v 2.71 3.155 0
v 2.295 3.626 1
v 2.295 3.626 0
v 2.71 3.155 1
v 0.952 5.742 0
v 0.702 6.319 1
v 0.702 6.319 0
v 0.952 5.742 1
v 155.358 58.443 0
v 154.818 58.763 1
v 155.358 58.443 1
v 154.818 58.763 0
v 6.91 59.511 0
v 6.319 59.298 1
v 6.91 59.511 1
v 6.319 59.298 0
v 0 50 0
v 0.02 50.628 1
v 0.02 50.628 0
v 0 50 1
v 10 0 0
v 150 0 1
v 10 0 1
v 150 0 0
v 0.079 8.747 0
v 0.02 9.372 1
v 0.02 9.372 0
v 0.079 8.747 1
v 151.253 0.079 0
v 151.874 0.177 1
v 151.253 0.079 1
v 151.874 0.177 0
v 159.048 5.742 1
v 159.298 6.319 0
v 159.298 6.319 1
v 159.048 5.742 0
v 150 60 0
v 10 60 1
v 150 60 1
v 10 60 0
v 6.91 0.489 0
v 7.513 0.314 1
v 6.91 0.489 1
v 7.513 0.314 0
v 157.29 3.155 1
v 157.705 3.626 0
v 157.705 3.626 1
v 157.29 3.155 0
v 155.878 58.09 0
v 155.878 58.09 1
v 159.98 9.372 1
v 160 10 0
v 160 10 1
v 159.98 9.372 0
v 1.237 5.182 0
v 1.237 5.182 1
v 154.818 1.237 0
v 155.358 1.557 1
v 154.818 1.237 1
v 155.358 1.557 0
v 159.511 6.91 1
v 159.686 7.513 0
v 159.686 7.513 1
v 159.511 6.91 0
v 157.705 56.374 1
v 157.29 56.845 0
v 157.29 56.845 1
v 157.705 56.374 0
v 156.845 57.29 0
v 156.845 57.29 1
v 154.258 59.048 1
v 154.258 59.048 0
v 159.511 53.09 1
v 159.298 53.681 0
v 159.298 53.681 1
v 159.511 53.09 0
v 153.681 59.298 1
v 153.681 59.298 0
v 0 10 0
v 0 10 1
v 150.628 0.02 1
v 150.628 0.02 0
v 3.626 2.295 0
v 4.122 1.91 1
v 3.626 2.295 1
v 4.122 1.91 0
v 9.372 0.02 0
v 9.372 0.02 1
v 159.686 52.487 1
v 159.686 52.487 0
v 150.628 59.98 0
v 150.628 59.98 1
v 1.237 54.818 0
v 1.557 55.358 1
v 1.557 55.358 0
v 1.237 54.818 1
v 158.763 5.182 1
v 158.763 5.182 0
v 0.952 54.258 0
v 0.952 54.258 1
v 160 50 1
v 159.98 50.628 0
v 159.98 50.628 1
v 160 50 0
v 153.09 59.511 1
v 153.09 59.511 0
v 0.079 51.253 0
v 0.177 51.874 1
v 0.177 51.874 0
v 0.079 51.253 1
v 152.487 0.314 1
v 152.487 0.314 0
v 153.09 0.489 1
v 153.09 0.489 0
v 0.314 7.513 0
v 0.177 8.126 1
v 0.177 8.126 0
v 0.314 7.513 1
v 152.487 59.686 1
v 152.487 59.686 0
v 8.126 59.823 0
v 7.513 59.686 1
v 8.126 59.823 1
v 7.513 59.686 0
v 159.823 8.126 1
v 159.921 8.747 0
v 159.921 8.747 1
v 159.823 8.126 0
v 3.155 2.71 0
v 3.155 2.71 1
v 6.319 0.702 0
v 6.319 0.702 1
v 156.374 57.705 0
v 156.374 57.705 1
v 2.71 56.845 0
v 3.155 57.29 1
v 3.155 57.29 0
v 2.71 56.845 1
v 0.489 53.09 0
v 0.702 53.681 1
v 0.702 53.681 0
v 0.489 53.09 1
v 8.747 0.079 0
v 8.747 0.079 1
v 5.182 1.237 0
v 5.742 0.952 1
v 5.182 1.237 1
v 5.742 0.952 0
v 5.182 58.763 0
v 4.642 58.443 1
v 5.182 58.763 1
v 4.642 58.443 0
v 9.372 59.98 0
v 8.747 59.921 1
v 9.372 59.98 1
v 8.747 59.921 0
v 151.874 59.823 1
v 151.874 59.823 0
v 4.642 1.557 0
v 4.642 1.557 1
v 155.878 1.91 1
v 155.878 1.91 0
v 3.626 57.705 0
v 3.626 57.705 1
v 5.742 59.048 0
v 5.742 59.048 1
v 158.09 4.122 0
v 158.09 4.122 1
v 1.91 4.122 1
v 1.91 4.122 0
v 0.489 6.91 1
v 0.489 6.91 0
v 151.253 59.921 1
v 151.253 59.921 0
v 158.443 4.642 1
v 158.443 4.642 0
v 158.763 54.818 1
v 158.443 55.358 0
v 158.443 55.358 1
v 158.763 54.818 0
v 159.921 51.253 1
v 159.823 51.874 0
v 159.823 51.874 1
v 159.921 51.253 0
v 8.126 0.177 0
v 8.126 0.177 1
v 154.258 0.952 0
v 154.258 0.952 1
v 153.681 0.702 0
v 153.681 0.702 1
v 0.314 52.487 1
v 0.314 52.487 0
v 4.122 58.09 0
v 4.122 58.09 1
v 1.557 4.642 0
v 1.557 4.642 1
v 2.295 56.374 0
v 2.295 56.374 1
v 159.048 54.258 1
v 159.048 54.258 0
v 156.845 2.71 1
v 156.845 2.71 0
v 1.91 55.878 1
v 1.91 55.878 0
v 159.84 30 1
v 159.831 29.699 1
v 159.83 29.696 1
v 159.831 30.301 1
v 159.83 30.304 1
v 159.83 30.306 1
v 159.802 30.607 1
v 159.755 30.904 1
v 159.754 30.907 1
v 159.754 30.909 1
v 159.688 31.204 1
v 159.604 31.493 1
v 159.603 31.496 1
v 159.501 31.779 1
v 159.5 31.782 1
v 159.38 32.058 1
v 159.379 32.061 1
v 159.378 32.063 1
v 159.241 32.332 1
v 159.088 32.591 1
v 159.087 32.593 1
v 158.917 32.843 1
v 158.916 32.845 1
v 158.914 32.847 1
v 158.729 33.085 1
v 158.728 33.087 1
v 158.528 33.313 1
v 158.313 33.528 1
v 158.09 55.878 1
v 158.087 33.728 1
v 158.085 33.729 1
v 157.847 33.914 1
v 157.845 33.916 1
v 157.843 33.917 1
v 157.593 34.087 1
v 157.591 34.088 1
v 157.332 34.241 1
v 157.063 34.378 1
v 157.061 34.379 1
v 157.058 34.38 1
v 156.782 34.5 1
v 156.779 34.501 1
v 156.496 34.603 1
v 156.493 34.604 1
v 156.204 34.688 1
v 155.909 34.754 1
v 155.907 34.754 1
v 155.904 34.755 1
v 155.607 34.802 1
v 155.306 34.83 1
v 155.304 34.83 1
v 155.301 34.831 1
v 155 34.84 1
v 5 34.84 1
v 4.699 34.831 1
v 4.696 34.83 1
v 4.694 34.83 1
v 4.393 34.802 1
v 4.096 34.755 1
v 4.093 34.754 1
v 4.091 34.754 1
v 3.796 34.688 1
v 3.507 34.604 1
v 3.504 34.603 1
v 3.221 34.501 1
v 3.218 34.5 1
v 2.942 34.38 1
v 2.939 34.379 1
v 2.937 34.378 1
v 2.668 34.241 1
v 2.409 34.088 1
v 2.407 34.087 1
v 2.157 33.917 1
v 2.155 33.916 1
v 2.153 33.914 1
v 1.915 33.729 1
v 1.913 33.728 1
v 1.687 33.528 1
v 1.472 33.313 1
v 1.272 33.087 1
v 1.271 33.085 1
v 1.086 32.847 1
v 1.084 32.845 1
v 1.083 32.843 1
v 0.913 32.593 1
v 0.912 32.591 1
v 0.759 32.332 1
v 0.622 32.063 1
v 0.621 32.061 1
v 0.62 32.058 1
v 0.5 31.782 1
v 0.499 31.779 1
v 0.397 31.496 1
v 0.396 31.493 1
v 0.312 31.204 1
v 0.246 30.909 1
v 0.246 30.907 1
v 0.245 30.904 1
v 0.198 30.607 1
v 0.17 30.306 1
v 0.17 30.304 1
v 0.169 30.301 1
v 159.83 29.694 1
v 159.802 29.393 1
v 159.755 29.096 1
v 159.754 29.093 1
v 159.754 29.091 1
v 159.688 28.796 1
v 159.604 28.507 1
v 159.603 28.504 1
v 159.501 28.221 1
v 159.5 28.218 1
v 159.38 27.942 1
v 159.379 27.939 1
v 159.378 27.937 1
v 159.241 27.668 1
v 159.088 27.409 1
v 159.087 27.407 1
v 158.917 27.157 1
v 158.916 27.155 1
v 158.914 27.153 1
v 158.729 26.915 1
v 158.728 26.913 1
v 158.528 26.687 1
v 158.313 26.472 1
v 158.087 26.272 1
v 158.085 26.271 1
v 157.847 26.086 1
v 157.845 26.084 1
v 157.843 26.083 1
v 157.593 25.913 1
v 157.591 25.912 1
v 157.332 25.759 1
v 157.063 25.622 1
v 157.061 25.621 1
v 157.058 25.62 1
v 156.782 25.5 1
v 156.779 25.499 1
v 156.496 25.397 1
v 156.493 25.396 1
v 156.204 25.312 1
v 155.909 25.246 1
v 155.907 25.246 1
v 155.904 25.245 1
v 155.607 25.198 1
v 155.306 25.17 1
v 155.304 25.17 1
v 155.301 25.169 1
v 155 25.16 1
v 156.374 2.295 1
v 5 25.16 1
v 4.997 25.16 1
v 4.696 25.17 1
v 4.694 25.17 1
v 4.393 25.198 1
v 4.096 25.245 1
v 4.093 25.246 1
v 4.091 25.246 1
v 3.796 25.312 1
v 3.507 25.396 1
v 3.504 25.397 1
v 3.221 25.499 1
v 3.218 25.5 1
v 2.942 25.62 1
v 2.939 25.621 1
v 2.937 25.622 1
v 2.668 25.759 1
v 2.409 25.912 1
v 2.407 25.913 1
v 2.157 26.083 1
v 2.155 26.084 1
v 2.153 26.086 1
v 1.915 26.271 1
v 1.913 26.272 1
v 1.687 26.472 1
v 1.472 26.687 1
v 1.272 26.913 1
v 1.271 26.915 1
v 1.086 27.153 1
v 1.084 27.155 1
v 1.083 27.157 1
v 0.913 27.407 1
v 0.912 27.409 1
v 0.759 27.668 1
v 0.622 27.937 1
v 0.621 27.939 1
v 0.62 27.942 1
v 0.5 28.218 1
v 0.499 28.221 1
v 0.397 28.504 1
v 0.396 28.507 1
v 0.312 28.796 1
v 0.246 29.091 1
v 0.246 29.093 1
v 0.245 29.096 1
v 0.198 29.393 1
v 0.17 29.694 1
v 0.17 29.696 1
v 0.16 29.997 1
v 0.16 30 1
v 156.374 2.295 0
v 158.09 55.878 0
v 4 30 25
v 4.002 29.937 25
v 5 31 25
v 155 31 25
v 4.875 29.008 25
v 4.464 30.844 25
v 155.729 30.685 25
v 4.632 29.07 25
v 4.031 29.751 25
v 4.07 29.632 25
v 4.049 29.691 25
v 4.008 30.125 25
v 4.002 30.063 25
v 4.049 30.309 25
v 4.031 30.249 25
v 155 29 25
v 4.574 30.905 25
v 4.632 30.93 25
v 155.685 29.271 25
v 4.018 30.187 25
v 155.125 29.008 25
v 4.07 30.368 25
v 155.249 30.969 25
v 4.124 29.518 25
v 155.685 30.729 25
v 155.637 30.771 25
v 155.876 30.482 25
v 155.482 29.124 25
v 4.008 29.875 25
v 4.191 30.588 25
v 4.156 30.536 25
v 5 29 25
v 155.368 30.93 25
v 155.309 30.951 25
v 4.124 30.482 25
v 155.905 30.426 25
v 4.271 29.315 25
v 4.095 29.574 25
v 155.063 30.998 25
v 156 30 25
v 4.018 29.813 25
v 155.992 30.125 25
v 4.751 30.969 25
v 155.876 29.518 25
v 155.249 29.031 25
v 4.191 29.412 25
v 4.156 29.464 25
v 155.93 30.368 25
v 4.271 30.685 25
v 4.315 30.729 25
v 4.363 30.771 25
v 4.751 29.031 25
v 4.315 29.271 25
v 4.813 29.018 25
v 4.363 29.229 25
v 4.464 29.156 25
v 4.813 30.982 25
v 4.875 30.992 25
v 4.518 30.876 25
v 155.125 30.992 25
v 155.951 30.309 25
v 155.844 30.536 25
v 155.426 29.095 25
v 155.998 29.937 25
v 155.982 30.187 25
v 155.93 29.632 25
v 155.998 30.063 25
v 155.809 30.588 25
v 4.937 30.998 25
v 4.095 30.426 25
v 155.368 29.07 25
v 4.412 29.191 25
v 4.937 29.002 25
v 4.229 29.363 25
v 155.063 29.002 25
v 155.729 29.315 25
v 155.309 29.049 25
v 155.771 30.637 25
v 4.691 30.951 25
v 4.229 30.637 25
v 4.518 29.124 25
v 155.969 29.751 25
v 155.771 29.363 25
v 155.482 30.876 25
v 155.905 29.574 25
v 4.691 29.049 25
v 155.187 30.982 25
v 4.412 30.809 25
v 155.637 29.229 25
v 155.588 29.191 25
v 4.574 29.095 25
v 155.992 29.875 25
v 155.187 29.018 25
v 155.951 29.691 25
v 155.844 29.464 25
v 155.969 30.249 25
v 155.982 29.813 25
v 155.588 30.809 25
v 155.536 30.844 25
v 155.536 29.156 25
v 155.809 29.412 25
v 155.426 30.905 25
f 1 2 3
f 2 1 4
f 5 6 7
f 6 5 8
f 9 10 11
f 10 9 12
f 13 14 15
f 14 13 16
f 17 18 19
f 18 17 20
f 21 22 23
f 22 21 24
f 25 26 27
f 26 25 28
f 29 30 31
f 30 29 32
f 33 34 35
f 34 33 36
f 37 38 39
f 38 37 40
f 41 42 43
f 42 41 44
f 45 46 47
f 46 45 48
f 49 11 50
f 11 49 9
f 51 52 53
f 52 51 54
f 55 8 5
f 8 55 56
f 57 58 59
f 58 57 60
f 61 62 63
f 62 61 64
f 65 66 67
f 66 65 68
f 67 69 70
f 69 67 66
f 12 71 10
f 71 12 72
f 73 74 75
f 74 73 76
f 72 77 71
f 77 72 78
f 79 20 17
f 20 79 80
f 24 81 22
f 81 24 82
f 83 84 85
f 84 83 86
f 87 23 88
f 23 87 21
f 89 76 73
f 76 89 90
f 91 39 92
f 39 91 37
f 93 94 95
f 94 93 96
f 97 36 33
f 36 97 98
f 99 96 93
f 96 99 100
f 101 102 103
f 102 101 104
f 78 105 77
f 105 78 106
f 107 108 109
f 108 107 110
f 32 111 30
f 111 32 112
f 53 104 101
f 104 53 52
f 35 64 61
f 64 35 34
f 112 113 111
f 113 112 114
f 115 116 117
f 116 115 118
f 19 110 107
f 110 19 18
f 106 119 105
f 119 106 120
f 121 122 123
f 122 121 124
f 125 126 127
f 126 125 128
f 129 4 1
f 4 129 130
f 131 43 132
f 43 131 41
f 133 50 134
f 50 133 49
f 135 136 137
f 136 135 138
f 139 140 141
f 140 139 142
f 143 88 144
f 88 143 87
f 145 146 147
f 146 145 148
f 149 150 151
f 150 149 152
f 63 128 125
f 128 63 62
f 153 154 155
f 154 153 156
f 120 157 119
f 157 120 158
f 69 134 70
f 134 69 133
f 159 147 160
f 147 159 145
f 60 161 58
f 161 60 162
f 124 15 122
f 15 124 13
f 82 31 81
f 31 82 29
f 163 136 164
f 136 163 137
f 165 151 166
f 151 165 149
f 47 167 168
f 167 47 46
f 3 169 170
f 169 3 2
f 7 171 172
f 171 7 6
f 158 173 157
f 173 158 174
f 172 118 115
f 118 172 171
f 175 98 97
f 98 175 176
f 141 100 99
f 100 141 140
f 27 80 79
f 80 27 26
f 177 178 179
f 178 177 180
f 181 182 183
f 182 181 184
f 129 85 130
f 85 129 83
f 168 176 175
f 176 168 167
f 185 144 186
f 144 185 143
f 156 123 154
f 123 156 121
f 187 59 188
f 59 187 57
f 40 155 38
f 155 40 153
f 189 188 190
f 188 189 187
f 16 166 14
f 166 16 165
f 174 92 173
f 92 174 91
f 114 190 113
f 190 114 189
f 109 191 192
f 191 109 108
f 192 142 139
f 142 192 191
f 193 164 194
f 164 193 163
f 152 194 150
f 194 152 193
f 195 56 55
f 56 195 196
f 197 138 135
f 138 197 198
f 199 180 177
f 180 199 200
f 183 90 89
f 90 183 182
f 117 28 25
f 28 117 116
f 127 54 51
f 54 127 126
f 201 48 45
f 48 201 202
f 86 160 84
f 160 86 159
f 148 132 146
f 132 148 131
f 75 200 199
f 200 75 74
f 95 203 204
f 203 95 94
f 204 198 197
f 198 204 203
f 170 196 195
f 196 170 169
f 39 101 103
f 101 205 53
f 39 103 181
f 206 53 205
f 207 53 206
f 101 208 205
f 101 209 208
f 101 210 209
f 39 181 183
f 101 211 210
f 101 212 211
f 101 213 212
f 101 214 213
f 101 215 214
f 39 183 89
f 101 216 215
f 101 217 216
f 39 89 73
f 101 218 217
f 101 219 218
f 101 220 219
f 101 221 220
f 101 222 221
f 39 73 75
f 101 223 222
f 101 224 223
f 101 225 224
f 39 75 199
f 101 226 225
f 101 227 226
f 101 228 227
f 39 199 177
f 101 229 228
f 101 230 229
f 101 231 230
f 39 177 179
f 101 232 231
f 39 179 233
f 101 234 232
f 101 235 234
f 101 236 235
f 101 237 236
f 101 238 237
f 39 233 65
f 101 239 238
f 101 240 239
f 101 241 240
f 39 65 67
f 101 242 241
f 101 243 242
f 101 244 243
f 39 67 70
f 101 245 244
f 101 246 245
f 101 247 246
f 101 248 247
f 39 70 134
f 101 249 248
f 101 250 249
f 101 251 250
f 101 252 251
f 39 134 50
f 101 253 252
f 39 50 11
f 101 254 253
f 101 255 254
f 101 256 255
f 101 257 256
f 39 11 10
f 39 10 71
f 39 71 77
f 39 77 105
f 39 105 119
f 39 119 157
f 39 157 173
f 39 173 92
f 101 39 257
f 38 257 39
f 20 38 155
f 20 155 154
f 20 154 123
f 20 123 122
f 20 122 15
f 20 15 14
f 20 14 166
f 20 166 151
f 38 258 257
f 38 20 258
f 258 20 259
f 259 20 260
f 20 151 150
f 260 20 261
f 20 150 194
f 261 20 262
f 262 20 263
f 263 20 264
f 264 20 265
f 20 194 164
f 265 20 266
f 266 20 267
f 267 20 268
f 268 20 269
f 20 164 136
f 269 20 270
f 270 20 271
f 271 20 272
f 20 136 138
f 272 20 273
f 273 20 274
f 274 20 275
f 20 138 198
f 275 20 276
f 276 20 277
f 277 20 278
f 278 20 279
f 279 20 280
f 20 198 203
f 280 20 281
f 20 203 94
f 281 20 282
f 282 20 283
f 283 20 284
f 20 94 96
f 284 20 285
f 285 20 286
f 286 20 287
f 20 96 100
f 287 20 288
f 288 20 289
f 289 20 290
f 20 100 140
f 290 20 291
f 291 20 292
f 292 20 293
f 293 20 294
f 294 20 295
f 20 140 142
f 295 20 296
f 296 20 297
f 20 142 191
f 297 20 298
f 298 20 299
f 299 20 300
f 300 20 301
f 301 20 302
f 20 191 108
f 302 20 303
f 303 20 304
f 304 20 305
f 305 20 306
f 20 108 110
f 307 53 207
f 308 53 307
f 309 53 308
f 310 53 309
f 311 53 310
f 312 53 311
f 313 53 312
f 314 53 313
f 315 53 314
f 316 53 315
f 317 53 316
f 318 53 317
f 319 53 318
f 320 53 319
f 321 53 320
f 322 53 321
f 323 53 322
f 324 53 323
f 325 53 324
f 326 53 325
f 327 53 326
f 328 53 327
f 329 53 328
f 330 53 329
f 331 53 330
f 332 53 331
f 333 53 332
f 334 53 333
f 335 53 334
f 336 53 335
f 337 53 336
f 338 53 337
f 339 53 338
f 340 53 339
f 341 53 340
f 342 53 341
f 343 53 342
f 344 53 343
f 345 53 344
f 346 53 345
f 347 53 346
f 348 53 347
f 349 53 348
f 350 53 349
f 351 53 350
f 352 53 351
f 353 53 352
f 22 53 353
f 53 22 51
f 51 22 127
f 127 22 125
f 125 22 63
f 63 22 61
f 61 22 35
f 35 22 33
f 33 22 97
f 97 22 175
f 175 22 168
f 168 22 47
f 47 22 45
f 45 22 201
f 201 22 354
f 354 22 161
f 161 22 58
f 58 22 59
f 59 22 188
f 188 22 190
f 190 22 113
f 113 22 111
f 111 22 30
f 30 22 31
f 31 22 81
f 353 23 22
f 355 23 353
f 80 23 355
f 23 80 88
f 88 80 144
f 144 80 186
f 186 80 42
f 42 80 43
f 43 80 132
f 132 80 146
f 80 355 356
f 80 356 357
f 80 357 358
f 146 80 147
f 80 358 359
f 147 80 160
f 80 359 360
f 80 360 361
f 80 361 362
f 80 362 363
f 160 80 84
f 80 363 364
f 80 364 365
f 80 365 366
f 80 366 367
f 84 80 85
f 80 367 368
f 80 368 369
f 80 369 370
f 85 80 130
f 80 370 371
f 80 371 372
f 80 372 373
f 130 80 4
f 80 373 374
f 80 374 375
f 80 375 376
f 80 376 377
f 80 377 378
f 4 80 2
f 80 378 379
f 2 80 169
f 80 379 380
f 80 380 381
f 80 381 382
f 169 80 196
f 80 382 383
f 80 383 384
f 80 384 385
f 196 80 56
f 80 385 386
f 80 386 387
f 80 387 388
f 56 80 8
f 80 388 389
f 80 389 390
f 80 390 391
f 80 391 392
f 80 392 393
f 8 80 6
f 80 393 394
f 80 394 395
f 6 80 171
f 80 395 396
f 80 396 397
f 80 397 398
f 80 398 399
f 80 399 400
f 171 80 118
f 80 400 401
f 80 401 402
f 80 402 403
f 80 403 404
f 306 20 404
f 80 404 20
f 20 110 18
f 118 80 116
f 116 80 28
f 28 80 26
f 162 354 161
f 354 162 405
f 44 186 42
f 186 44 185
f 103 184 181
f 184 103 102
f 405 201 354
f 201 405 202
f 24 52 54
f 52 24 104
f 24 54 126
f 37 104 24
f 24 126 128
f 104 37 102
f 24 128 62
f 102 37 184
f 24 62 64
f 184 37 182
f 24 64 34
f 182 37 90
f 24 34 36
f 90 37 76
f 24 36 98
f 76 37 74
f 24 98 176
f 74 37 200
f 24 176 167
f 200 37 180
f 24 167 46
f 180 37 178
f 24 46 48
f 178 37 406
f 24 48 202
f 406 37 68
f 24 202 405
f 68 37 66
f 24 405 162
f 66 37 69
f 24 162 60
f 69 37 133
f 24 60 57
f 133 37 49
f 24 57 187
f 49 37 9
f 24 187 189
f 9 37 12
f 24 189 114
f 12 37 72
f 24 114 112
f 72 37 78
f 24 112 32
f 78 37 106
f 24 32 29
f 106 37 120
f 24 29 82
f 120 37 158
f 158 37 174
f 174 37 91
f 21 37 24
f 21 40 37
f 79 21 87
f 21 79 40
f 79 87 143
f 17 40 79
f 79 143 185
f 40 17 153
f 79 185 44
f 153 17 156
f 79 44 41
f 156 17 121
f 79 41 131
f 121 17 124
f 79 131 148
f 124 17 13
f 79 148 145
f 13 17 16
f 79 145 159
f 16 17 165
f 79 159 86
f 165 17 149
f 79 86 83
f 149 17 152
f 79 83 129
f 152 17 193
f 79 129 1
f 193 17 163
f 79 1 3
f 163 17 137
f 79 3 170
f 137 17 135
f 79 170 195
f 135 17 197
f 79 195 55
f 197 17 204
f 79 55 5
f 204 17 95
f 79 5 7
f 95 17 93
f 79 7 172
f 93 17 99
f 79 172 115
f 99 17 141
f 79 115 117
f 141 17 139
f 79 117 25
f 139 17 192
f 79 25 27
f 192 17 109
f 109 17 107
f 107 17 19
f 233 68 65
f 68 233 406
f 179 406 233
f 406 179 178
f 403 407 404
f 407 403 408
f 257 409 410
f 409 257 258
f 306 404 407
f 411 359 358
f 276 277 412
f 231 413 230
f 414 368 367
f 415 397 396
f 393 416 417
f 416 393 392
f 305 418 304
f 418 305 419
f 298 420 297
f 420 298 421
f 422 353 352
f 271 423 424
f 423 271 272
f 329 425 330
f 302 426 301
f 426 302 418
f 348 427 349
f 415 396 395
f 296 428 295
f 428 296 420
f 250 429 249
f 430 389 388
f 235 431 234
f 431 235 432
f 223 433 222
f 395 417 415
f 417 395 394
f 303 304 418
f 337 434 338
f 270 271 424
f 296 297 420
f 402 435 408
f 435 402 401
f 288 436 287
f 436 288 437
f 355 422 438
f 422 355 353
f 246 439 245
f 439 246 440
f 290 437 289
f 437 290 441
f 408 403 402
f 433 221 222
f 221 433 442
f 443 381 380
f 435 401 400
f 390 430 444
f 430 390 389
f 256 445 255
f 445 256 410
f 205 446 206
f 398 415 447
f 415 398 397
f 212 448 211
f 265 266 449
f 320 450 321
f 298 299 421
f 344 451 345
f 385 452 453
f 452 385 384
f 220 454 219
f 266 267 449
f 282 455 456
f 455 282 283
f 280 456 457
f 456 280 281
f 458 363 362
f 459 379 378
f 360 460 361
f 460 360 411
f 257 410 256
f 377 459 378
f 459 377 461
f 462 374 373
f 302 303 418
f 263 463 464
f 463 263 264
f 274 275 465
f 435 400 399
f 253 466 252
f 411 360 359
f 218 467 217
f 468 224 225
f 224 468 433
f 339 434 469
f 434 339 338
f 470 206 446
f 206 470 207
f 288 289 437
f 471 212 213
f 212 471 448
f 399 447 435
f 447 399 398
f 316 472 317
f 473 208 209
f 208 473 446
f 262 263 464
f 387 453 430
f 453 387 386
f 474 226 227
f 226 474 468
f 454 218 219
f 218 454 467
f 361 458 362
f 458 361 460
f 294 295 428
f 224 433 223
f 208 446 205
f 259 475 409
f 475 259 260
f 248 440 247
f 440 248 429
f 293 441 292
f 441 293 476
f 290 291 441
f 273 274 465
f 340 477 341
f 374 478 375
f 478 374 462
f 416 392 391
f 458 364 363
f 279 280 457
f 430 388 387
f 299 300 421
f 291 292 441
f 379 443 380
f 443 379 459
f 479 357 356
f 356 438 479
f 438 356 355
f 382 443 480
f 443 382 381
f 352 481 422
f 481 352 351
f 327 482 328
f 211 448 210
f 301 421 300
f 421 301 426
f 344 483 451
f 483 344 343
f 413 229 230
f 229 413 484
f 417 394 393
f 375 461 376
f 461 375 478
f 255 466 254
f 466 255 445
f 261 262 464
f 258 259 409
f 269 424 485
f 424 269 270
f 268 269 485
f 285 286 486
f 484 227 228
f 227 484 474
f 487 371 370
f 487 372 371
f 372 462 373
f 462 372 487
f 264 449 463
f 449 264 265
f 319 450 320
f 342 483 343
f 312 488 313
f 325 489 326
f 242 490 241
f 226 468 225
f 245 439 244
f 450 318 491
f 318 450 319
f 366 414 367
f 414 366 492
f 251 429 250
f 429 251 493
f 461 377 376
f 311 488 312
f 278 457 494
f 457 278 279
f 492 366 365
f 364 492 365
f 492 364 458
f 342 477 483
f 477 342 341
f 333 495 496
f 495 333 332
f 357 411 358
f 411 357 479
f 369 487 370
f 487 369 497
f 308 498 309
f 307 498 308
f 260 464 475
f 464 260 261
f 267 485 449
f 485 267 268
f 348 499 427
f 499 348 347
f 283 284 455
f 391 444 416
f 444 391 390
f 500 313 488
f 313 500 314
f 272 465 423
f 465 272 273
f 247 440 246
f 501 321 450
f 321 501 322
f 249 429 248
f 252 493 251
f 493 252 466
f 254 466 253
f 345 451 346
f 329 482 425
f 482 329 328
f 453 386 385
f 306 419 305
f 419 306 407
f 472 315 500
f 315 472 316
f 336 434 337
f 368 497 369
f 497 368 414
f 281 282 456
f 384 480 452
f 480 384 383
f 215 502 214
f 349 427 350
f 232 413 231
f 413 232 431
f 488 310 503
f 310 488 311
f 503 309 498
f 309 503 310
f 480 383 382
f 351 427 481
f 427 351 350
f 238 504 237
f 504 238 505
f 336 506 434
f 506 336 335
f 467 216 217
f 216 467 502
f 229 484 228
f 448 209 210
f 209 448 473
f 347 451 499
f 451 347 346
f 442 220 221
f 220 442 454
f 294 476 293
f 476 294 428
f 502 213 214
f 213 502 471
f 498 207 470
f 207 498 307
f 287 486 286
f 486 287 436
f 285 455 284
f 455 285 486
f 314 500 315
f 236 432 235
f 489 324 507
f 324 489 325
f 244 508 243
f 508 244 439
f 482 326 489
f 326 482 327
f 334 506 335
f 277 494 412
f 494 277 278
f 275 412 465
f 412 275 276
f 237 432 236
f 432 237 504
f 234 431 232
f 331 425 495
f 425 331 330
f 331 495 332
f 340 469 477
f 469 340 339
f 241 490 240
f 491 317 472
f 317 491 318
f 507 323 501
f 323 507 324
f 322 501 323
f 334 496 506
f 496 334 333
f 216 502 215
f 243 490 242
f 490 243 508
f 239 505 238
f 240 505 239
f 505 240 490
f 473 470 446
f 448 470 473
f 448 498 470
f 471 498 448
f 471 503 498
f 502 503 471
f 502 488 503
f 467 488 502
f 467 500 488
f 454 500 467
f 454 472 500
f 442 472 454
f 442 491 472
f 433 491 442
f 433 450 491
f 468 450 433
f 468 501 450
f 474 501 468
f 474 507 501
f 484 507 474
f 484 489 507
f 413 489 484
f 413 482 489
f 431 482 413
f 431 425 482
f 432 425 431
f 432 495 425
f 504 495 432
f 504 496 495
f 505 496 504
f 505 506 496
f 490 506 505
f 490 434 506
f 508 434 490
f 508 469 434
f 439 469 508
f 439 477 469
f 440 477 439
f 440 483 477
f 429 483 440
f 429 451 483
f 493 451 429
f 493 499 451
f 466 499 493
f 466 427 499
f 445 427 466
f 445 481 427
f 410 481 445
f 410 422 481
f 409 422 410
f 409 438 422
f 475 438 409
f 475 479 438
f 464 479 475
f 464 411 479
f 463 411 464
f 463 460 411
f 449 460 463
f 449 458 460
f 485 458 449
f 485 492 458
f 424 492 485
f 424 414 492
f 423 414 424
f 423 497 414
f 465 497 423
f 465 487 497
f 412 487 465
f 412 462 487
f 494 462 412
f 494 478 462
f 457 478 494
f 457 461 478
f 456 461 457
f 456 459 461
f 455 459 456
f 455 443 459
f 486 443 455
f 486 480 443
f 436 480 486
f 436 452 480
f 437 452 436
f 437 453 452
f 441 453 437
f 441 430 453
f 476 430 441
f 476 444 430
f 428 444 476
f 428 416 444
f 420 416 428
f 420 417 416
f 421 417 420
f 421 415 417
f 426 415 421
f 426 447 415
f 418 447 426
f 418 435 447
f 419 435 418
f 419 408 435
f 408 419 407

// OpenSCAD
$fn = 100;

module ladeVerdeler(width = 60, length= 160) {
  
  translate([10, 10, 0])
    minkowski() {
      cube([length - 20, width - 20, 1]);
      
      cylinder(h=0.00001, r=10);
    }
    

    hull() {
      translate([5, width / 2, 0])
        cylinder(h=25, r1=5, r2=1);
      
      translate([length - 5, width / 2, 0])
        cylinder(h=25, r1=5, r2=1);
    }
}

//ladeVerdeler(width = 120, length= 160);
ladeVerdeler(width = 60, length= 160);
